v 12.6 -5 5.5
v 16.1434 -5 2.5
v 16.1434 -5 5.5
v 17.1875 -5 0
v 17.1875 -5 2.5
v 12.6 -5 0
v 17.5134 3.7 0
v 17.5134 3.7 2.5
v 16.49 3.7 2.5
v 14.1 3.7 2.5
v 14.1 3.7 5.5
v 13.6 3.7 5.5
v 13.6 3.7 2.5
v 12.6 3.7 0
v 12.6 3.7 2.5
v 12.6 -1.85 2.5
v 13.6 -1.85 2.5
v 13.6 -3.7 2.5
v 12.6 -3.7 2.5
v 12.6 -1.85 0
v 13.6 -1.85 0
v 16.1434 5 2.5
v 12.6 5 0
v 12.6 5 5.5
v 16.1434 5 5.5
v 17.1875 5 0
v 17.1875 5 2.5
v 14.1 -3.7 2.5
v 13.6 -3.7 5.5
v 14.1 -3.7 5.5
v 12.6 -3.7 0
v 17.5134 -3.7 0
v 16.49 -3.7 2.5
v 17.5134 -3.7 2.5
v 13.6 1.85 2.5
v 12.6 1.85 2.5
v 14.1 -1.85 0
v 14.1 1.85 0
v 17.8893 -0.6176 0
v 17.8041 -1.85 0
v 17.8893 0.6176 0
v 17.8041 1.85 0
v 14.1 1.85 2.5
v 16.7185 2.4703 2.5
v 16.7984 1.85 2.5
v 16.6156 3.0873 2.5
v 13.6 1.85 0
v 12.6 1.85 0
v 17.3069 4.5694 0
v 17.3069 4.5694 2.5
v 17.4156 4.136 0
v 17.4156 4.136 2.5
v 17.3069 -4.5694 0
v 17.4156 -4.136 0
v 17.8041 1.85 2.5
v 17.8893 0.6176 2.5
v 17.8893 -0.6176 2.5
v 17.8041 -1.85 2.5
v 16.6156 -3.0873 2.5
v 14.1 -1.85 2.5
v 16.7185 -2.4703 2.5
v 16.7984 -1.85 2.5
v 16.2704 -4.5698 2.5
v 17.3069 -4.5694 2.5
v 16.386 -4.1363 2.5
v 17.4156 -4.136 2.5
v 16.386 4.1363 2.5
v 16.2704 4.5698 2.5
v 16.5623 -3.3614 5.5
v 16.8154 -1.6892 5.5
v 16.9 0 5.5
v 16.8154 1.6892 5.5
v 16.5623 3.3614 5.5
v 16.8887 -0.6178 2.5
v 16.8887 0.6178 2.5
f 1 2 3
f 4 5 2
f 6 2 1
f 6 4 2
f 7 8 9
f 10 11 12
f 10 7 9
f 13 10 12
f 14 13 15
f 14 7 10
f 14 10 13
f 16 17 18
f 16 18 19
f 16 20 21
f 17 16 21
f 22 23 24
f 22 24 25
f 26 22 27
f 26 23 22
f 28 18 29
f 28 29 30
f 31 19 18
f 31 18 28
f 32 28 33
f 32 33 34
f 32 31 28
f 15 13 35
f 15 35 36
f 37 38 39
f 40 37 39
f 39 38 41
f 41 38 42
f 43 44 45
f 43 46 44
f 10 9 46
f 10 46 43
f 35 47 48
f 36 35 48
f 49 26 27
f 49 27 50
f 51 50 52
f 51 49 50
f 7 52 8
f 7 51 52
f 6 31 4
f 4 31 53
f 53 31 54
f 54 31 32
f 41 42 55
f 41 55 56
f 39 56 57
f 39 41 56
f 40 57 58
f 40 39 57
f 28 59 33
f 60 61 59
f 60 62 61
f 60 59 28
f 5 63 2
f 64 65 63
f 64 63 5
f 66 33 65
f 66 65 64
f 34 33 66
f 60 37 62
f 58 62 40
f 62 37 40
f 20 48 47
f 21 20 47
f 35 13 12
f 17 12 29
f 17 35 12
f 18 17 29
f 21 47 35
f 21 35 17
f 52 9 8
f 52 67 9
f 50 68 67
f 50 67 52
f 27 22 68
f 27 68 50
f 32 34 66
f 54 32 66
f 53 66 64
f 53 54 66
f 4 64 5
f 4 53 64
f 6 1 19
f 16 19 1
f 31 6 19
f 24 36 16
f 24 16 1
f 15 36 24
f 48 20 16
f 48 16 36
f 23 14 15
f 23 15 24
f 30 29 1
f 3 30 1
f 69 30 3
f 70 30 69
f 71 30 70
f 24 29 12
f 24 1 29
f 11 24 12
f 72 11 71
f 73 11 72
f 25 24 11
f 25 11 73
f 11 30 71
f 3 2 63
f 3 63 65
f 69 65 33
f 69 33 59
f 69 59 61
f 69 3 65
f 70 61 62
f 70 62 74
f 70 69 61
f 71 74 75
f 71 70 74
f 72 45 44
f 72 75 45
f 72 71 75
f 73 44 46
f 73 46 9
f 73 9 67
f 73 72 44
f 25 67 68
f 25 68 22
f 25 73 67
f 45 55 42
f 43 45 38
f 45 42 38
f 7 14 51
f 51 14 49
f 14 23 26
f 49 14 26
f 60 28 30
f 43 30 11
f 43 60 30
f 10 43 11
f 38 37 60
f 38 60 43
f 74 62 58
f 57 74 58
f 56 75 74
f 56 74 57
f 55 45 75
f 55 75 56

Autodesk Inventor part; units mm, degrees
ref_plane "YZ Plane" through (0, 0, 0) normal (1, 0, 0) x (0, 1, 0)
ref_plane "XZ Plane" through (0, 0, 0) normal (0, 1, 0) x (-1, 0, 0)
ref_plane "XY Plane" through (0, 0, 0) normal (0, 0, 1) x (1, 0, 0)
sketch "スケッチ1" plane through (0, 0, 0) normal (0, 0, 1) x (1, 0, 0)
  arc A0 (17.1875, -5) -> (17.1875, 5) centre (0, 0) ccw
  line L0 (17.9, -5) -> (12.6, -5)
  line L1 (12.6, -5) -> (12.6, 5)
  line L2 (12.6, 5) -> (17.9, 5)
  line L3 (17.9, 5) -> (17.9, -5)
  point P0 (12.6, 0)
  dimension "d0" = 17.9
  dimension "d1" = 10
  dimension "d2" = 5.3
extrude "押し出し1" add sketch "スケッチ1" along normal blind 5.5 contours L0 L1 L2 A0
sketch "スケッチ2" plane through (0, 0, 0) normal (0, 0, -1) x (-1, 0, 0)
  line L0 (-12.6, 5) -> (-12.6, -5) projected
  line L1 (-12.6, -3.7) -> (-17.9, -3.7)
  line L2 (-17.9, -3.7) -> (-17.9, 3.7)
  line L3 (-17.9, 3.7) -> (-12.6, 3.7)
  line L4 (-12.6, 3.7) -> (-12.6, -3.7)
  line L5 (-12.6, 5) -> (-12.6, -5) projected
  line L6 (-12.6, -5) -> (-17.1875, -5) projected
  arc A0 (-17.1875, 5) -> (-17.1875, -5) centre (0, 0) ccw projected
  line L7 (-12.6, -1.85) -> (-17.9, -1.85)
  line L8 (-17.9, -1.85) -> (-17.9, 1.85)
  line L9 (-17.9, 1.85) -> (-12.6, 1.85)
  line L10 (-12.6, 1.85) -> (-12.6, -1.85)
  point P0 (-12.6, 0)
  point P1 (-12.6, 0)
  point P2 (-17.8041, -1.85)
  point P3 (-17.5134, -3.7)
  point P4 (-17.8041, 1.85)
  point P5 (-17.5134, 3.7)
  dimension "d5" = 1.3
  dimension "d6" = 3.7
extrude "押し出し2" cut sketch "スケッチ2" against normal blind 2.5 contours L0 L9 A0 L3 | L0 L1 A0 L7
sketch "スケッチ3" plane through (0, 0, 0) normal (0, 0, -1) x (-1, 0, 0)
  line L0 (-12.6, -3.7) -> (-17.5134, -3.7) projected
  line L1 (-17.5134, 3.7) -> (-12.6, 3.7) projected
  line L2 (-13.6, -3.7) -> (-14.1, -3.7)
  line L3 (-14.1, -3.7) -> (-14.1, 3.7)
  line L4 (-14.1, 3.7) -> (-13.6, 3.7)
  line L5 (-13.6, 3.7) -> (-13.6, -3.7)
  line L6 (-12.6, 1.85) -> (-12.6, -1.85) projected
  point P0 (0, 0)
  dimension "d9" = 0.5
  dimension "d10" = 1
extrude "押し出し3" cut sketch "スケッチ3" against normal through all
sketch "スケッチ4" plane through (0, 0, 5.5) normal (0, 0, 1) x (1, 0, 0)
  line L0 (12.6, -5) -> (17.1875, -5) projected
  arc A0 (16.1434, -5) -> (16.1434, 5) centre (0, 0) ccw
  line L1 (17.1875, 5) -> (12.6, 5) projected
  arc A1 (17.1875, -5) -> (17.1875, 5) centre (0, 0) ccw projected
  dimension "d13" = 1
extrude "押し出し4" cut sketch "スケッチ4" against normal up to surface (3 mm away)
properties part number "555_CapAccessory_2" material "アセタール樹脂、白"
